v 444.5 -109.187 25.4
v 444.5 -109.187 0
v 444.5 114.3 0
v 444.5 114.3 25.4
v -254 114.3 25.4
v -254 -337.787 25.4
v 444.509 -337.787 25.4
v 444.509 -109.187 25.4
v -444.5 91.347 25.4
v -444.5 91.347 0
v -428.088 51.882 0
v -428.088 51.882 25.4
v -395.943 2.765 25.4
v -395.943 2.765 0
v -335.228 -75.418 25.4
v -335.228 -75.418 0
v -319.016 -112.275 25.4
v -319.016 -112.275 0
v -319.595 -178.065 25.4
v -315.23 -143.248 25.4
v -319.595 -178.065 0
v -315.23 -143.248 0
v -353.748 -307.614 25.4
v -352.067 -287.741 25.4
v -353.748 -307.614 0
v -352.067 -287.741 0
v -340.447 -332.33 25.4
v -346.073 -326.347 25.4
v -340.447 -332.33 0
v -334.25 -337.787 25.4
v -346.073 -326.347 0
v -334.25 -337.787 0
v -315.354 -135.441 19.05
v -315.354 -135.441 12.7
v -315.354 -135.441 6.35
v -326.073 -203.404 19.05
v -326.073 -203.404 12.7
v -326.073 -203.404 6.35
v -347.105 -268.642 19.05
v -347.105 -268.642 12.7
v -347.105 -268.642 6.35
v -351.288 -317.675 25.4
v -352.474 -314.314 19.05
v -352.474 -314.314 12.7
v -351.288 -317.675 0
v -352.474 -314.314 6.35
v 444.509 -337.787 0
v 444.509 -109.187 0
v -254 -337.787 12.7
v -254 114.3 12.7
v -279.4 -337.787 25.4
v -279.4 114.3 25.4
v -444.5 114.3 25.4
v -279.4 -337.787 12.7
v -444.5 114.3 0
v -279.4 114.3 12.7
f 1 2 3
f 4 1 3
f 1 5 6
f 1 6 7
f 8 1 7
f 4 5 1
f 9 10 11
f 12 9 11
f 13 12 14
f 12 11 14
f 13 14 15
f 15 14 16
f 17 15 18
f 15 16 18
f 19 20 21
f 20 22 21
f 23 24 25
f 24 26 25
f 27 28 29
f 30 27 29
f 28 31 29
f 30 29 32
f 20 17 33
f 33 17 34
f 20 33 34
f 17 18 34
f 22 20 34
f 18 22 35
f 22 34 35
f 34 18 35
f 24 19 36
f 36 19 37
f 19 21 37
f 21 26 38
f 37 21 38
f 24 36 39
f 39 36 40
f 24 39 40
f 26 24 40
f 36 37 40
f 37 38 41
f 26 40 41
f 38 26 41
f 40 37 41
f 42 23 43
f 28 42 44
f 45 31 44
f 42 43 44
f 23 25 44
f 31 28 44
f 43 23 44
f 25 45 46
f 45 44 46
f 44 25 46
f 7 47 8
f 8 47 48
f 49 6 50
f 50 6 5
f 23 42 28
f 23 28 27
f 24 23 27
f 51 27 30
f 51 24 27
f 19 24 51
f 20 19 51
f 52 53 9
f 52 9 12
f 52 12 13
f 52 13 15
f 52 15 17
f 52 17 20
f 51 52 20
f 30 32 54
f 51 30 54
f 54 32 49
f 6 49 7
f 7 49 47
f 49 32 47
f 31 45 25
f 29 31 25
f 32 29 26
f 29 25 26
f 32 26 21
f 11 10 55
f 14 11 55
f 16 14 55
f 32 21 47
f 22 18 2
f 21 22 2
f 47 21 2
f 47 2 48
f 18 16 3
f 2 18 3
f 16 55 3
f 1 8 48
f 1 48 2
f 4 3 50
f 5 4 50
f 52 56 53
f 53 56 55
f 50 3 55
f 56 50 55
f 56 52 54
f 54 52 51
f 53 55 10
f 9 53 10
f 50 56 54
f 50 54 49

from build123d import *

# Parameters (mm, degrees)
F0_W     = 888.9909996986
F0_H     = 5.1128612518
F1_DEPTH = 25.4
F3_DEPTH = 12.7
F5_DEPTH = 25.4


with BuildPart() as f1:
    # F0 (on Top) → F1 (new body)
    with BuildSketch(Plane.XY):
        Polygon((444.5, -109.1871387482), (444.5, 114.3), (-444.5, 114.3), (-444.5, -114.3), (-444.4909996986, -114.3), (-444.4909996986, -109.1871387482), align=None)
        Polygon((444.5090003014, -109.1871387482), (444.5, -109.1871387482), (444.5, -114.3), (-444.4909996986, -114.3), (-444.4909996986, -337.7871387482), (444.5090003014, -337.7871387482), align=None)
        with Locations((0.0045001507, -111.7435693741)):
            Rectangle(F0_W, F0_H)
    extrude(amount=F1_DEPTH)

    # F2 (on face) → F3 (cut)
    with BuildSketch(Plane.XY.offset(25.4)):
        Polygon((-266.7, 114.3), (-279.4, 114.3), (-279.4, -337.7871387482), (-254, -337.7871387482), (-254, 114.3), align=None)
    extrude(amount=-F3_DEPTH, mode=Mode.SUBTRACT)

    # F4 (on face) → F5 (cut)
    with BuildSketch(Plane(origin=(0, 0, 0), x_dir=(1, 0, 0), z_dir=(0, 0, -1))):
        with BuildLine():
            Line((-444.5, 114.3), (-444.5, -91.3470163941))
            add(Edge.make_bspline(
                [(-444.5, -91.3470163941), (-439.8643107844, -70.3071791015), (-396.5612558672, 10.0595120676), (-272.6729040405, 121.5892977787), (-374.2433991601, 303.6629585996), (-343.9956112011, 329.4717163372), (-334.2497050762, 337.7871387482)],
                knots=[0.1020972669, 0.1020972669, 0.1020972669, 0.1020972669, 0.3199118394, 0.5865273881, 0.8667797776, 1, 1, 1, 1], degree=3))
            Line((-334.2497050762, 337.7871387482), (-444.4909996986, 337.7871387482))
            Line((-444.4909996986, 337.7871387482), (-444.4909996986, 114.3))
            Line((-444.4909996986, 114.3), (-444.5, 114.3))
        make_face()
    extrude(amount=-F5_DEPTH, mode=Mode.SUBTRACT)


solid = f1.part
